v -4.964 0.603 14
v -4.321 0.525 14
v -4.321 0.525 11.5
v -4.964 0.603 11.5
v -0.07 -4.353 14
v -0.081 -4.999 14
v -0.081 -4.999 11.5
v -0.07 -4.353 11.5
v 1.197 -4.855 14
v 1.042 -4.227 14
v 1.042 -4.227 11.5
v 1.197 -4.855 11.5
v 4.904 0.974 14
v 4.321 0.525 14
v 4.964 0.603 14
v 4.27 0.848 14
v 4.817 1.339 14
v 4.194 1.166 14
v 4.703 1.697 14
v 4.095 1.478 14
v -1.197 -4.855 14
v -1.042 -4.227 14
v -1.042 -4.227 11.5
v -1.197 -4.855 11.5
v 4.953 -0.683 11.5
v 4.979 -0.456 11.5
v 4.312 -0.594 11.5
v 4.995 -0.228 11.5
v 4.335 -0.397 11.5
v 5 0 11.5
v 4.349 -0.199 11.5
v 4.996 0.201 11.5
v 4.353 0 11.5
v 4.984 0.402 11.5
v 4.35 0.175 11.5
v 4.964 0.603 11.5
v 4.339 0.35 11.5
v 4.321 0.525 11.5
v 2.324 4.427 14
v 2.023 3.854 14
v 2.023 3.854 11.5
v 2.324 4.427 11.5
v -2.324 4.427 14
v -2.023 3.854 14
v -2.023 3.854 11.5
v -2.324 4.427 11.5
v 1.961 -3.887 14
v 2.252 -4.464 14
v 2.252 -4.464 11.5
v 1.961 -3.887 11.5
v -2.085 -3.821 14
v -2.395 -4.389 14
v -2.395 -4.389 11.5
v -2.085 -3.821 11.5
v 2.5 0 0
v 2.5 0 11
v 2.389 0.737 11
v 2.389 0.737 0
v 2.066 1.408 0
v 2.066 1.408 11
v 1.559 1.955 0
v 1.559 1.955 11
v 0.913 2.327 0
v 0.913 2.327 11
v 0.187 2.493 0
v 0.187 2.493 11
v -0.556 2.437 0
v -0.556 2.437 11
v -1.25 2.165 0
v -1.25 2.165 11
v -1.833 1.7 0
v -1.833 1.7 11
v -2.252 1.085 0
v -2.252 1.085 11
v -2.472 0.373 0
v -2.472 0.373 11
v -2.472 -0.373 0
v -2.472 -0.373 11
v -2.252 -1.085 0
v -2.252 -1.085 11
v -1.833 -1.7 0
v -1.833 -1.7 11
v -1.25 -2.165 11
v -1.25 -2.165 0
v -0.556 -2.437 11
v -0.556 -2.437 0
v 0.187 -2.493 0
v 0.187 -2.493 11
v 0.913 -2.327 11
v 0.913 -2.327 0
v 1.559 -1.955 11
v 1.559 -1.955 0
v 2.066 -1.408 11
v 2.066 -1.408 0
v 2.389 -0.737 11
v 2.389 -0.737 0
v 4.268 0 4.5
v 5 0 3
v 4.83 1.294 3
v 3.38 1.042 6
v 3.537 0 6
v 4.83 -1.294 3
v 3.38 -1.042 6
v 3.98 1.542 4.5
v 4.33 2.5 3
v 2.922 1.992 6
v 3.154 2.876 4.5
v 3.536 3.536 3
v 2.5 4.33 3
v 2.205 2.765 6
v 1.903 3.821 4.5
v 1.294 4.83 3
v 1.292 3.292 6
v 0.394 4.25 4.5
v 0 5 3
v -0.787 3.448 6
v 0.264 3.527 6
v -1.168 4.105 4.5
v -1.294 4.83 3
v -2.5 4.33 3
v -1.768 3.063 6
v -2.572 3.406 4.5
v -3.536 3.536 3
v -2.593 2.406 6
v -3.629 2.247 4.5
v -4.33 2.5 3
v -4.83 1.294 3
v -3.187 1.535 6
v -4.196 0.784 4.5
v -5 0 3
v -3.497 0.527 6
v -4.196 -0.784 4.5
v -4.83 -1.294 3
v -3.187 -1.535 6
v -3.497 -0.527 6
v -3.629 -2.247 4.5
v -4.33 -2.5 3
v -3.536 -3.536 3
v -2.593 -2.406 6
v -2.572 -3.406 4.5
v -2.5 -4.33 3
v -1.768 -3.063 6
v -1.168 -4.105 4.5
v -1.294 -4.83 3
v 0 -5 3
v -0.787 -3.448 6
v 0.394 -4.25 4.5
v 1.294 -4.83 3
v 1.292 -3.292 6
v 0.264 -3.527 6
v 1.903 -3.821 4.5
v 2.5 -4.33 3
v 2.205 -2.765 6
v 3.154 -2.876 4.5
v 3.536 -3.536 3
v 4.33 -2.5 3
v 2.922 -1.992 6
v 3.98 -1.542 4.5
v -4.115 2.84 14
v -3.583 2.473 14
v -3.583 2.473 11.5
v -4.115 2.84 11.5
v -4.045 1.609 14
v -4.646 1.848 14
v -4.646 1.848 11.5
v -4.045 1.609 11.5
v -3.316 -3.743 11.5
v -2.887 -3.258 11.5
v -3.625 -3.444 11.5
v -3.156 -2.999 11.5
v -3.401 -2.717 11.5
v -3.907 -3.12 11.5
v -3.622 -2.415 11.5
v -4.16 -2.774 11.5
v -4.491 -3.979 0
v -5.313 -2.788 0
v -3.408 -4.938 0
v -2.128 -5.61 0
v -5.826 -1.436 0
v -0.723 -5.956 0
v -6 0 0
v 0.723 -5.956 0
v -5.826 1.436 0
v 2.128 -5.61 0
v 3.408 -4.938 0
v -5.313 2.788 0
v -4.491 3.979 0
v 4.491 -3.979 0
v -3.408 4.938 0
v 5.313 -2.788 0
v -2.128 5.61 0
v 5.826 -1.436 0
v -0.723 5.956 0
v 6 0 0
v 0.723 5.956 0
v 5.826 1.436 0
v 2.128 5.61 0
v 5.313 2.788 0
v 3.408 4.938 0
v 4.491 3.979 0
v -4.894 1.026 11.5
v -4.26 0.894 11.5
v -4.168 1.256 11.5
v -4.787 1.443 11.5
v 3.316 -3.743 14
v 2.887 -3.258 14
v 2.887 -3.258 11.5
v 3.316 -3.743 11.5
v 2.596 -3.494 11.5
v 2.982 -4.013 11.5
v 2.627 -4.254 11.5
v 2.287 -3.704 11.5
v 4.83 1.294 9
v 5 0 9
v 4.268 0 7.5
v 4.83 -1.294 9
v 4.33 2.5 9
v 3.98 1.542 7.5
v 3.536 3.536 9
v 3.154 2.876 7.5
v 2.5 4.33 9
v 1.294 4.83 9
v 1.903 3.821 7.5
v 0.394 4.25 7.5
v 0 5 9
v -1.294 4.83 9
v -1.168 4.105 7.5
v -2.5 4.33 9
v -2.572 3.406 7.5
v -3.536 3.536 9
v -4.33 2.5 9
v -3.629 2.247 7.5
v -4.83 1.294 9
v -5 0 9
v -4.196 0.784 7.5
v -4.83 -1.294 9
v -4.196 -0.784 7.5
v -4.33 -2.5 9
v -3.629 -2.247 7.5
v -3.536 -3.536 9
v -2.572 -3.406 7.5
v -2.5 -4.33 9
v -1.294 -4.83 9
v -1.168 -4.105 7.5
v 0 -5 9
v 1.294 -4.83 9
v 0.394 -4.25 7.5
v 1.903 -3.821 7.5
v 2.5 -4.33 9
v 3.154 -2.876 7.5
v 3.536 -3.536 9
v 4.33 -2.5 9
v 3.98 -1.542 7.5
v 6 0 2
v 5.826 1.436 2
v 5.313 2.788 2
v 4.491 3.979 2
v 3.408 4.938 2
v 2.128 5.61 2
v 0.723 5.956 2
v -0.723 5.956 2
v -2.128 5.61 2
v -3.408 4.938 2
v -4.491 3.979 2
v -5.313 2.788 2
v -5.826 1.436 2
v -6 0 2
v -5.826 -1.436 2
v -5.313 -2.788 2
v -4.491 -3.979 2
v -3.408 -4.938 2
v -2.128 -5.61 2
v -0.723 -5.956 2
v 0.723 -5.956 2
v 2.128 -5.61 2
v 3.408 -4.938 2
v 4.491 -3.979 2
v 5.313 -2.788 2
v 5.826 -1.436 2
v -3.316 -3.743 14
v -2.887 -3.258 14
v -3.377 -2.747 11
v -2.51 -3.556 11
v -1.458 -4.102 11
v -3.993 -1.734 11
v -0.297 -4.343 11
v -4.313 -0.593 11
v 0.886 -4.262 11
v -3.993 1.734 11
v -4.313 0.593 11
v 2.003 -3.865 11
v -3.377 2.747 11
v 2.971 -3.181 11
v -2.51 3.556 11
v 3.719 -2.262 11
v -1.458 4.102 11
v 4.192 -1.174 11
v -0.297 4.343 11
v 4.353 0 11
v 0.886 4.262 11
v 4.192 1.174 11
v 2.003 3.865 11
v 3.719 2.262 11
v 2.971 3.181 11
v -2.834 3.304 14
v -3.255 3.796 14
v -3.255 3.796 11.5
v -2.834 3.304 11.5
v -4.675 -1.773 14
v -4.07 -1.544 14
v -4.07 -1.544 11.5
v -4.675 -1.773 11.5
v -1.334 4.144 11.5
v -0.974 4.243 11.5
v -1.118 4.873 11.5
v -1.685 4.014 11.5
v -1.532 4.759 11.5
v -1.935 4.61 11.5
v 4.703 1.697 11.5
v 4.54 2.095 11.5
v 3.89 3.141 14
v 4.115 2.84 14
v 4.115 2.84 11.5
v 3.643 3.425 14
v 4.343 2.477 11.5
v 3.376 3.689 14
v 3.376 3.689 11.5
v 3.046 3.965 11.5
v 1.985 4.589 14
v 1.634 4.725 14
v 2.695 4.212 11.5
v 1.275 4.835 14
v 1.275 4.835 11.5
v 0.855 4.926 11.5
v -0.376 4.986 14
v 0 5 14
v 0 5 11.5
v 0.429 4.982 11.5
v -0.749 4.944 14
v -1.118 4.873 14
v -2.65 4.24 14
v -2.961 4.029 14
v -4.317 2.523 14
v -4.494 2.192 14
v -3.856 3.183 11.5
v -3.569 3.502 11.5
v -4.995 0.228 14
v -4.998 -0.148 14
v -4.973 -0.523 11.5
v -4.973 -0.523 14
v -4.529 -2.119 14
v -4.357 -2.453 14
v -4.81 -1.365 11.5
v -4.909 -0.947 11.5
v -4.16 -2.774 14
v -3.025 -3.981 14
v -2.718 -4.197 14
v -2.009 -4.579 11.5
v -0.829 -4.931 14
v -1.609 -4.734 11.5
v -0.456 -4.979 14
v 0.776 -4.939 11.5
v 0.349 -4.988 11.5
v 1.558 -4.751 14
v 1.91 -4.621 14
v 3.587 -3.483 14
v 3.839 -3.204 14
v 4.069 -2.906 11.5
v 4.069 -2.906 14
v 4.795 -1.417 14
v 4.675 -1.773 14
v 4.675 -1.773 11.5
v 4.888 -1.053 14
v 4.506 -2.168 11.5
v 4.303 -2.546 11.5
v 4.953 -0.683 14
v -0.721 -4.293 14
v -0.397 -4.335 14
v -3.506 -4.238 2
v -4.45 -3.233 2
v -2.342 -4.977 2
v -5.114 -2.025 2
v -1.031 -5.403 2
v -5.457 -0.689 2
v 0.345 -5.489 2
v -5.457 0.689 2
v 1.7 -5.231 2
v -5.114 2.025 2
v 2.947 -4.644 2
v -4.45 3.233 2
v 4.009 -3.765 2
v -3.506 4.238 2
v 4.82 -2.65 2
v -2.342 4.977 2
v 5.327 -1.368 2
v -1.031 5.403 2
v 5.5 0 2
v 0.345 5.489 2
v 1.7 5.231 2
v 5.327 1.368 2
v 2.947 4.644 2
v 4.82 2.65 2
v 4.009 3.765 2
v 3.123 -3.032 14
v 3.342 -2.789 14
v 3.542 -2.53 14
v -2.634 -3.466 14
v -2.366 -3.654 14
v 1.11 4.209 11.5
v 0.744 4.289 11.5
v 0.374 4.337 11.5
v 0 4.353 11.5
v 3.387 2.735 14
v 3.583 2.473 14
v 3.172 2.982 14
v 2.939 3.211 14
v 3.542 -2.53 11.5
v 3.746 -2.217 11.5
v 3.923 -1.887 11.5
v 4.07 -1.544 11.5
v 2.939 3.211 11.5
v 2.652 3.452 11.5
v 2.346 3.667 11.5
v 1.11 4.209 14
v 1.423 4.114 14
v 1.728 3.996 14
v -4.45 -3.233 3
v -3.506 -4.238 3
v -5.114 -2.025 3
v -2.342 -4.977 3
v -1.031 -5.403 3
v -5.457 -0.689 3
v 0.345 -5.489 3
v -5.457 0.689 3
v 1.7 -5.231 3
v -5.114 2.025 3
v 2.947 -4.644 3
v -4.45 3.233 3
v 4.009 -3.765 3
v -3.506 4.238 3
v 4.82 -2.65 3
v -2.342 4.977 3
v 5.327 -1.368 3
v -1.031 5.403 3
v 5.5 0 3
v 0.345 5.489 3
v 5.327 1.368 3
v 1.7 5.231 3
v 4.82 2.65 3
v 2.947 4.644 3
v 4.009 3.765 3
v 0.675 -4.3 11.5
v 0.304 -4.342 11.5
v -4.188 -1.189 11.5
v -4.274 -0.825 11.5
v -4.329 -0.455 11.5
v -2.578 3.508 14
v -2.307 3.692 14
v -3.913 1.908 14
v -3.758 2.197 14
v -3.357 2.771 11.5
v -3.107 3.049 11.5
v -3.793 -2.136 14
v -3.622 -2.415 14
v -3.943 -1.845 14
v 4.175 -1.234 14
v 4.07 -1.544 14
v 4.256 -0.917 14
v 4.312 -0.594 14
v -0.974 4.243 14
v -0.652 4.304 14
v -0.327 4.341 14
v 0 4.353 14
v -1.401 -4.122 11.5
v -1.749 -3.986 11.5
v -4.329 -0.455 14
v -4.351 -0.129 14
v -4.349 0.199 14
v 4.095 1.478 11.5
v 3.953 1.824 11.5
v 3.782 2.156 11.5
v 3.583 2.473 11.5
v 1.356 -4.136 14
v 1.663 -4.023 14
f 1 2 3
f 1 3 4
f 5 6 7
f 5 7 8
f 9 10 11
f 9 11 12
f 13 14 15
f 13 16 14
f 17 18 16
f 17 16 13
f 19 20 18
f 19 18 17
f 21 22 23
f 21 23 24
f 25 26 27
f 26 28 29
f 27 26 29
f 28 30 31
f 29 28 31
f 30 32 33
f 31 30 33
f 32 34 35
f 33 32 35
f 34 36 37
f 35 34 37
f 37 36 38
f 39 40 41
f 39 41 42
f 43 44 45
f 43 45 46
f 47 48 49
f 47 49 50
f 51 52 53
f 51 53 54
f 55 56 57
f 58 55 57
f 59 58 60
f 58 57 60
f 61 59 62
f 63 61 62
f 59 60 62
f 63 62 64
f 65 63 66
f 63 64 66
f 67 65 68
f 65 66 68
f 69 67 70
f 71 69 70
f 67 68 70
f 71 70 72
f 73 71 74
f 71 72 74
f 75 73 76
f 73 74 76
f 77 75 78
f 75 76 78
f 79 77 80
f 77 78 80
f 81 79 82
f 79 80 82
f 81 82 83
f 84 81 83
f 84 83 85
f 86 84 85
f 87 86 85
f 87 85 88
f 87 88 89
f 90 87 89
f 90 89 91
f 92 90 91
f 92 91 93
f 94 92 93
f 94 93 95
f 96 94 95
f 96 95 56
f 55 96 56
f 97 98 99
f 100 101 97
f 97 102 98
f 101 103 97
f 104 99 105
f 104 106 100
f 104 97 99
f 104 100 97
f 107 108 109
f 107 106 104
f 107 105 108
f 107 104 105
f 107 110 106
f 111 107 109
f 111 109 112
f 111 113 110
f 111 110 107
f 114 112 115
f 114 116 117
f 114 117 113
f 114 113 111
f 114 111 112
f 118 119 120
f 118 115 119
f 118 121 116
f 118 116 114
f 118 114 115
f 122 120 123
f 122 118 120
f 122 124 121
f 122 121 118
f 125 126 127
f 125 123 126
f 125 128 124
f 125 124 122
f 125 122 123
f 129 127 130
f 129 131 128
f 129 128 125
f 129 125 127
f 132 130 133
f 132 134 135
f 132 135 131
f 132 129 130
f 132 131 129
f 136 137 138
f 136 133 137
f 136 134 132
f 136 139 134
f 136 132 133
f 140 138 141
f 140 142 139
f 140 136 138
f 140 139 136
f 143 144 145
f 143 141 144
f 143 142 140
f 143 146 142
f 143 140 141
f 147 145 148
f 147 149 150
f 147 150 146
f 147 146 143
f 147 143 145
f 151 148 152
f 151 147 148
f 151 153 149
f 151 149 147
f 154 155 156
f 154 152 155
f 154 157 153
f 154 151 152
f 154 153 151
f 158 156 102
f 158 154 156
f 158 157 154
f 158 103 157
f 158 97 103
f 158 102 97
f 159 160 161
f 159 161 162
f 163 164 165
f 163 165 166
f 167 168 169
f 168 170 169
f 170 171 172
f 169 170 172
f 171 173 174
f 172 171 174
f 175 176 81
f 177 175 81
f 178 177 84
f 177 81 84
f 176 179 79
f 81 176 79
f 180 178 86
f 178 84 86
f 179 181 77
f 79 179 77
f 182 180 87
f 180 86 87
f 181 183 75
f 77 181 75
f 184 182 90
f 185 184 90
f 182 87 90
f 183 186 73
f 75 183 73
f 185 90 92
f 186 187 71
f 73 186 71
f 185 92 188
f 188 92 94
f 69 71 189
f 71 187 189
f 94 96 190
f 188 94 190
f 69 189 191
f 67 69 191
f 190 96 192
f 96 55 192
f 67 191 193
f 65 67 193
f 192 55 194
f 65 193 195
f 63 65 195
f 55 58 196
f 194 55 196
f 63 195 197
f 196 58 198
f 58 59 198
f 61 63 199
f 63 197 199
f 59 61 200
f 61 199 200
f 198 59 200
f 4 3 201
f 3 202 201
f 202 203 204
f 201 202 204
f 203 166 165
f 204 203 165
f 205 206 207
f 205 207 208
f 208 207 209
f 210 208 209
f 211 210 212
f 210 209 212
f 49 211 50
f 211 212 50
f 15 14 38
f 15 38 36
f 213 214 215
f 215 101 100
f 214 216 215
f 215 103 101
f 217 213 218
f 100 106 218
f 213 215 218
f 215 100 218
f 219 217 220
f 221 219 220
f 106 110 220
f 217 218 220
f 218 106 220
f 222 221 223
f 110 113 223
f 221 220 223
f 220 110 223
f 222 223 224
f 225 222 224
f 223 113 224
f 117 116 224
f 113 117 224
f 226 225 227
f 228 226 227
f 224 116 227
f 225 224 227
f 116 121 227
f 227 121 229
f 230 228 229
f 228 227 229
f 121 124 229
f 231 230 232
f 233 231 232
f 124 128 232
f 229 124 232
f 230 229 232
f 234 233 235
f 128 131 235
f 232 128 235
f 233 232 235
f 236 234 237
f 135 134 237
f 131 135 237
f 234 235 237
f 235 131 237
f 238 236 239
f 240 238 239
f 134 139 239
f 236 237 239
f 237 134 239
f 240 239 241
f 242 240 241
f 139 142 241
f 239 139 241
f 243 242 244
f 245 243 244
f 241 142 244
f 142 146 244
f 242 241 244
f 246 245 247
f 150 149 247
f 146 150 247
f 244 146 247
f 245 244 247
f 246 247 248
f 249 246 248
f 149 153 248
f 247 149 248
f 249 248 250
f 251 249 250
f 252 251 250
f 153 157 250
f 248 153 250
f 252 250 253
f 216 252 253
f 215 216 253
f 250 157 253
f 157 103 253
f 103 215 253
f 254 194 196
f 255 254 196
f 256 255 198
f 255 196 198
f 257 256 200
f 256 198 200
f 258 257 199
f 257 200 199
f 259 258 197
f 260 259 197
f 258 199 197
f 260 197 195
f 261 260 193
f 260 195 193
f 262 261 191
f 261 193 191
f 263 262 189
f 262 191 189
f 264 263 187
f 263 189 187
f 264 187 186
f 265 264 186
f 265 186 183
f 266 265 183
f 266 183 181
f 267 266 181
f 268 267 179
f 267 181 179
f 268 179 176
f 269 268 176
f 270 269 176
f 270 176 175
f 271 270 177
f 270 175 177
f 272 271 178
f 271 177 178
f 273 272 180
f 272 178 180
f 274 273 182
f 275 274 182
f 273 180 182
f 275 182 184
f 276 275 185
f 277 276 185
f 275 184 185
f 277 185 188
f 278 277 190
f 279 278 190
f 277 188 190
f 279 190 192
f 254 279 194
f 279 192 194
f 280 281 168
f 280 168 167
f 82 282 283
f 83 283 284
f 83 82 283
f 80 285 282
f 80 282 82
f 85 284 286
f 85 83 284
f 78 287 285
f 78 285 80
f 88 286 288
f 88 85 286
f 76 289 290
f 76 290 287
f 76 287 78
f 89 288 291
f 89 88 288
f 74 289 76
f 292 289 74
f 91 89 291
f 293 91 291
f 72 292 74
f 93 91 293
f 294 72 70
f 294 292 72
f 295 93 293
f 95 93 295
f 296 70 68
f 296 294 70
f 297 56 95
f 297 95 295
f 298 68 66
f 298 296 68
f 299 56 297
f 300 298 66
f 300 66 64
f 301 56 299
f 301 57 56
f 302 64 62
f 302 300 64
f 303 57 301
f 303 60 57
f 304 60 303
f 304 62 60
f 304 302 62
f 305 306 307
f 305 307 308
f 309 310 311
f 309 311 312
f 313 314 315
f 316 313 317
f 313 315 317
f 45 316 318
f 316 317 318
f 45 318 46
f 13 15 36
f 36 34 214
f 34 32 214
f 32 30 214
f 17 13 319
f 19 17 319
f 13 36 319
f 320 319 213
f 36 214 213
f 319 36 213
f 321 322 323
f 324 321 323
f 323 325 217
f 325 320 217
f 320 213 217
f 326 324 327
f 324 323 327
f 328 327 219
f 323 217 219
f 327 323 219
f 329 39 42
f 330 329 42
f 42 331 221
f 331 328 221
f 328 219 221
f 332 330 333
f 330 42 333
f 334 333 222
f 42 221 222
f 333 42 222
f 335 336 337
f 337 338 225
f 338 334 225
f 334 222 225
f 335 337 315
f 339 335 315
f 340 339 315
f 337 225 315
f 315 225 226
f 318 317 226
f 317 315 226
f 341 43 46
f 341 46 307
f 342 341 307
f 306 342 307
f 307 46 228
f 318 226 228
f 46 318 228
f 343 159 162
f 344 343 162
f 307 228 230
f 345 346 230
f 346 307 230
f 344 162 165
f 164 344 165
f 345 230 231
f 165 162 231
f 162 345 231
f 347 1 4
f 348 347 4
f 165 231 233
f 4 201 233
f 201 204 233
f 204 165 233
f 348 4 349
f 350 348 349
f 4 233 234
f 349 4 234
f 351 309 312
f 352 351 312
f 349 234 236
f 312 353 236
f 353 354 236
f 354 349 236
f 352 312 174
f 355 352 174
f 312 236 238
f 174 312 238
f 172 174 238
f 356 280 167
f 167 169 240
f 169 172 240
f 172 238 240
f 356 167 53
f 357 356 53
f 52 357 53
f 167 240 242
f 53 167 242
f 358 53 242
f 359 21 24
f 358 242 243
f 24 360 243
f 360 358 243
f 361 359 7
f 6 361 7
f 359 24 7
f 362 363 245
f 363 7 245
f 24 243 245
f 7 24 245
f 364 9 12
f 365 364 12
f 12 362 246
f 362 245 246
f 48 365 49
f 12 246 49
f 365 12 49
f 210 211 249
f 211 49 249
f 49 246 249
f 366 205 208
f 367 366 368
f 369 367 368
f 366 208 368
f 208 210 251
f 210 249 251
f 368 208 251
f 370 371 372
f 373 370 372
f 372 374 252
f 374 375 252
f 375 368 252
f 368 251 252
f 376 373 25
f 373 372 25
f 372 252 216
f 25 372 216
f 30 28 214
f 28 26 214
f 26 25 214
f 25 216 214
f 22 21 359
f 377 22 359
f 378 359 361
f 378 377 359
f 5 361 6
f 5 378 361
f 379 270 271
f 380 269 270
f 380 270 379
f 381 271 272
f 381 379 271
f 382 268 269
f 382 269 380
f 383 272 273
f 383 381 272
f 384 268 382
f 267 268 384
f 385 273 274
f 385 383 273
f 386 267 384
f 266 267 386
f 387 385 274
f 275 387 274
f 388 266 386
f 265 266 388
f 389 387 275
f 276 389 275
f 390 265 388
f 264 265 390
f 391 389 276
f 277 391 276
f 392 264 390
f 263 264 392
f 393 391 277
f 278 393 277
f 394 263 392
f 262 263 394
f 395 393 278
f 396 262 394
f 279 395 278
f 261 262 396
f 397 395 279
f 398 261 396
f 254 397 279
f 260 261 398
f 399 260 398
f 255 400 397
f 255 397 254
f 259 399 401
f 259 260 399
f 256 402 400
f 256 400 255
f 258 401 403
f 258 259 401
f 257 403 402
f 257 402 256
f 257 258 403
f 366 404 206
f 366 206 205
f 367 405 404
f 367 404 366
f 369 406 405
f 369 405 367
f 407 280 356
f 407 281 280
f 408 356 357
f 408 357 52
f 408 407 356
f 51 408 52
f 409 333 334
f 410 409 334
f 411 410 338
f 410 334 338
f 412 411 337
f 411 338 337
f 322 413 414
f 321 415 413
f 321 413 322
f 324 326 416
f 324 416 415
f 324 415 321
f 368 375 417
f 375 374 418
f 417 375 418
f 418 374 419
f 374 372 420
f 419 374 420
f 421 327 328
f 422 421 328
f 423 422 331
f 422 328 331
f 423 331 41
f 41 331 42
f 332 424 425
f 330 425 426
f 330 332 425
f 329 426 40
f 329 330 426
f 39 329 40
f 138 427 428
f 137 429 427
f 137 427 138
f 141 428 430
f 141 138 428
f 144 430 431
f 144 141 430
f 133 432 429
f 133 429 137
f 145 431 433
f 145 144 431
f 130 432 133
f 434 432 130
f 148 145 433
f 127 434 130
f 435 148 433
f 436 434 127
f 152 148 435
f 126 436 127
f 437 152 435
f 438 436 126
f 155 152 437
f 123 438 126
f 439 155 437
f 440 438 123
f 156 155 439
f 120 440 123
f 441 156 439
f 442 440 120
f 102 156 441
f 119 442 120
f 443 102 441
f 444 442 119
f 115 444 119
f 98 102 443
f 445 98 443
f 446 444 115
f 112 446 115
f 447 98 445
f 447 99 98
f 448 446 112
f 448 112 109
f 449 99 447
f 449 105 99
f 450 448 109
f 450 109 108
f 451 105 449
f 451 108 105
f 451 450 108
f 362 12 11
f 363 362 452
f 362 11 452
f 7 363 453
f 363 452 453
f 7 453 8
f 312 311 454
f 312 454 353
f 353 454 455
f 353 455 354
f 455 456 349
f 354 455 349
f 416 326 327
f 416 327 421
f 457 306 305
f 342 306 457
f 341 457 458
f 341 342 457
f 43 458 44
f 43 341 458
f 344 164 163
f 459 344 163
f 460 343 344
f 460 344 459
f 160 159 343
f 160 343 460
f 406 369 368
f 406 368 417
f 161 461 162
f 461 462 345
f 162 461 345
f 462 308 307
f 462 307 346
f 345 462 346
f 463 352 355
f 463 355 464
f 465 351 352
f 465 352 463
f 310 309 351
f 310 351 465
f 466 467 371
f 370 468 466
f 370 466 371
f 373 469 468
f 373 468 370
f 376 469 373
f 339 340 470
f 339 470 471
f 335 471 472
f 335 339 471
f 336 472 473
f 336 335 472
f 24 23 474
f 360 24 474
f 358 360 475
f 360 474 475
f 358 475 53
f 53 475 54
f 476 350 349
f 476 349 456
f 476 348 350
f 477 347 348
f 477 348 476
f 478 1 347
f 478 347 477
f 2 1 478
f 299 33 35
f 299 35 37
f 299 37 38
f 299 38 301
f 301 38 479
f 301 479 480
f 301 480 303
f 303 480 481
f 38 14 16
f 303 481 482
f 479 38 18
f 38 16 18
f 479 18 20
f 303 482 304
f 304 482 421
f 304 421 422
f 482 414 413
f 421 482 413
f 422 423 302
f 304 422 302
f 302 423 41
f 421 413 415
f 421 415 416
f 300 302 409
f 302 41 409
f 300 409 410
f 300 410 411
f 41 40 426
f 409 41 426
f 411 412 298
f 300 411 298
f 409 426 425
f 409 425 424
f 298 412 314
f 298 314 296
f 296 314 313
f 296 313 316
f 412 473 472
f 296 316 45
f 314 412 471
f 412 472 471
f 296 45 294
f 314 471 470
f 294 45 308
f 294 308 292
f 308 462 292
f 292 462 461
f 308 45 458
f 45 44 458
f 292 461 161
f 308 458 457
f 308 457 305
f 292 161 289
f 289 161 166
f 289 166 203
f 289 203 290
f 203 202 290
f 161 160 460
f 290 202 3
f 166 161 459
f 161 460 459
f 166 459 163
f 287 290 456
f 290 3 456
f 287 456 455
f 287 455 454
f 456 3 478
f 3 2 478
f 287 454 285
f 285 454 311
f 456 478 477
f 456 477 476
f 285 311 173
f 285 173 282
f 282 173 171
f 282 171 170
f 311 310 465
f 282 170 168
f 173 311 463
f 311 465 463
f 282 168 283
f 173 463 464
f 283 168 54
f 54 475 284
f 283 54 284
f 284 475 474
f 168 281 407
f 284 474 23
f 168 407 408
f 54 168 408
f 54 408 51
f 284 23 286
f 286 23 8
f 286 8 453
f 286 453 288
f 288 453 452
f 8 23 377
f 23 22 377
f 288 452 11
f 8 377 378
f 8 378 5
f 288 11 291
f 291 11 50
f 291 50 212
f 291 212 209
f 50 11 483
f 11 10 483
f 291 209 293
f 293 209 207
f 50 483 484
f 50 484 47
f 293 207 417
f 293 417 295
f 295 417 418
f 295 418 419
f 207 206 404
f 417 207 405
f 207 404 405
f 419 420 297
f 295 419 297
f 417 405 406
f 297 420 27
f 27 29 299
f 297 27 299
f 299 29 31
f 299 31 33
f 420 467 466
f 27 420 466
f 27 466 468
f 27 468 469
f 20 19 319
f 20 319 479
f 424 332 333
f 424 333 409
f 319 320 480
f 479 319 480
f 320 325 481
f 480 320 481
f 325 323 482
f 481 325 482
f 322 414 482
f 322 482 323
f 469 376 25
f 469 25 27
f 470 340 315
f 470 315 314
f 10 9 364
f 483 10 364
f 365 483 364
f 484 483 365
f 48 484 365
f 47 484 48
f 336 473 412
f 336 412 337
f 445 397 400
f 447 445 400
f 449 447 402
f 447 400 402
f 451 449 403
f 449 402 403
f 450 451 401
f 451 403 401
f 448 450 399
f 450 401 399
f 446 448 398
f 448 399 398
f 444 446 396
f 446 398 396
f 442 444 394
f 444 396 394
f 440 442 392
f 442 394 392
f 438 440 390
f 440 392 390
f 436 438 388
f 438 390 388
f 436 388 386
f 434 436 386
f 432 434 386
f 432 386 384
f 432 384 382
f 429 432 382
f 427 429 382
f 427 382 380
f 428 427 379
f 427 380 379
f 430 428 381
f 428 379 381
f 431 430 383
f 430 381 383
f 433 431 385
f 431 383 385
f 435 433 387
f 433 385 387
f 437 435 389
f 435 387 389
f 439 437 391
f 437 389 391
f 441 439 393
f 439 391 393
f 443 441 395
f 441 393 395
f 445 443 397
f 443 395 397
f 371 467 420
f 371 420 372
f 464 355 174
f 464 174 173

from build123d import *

# Parameters (mm, degrees)
SKETCH_1_R          = 6
EXTRUDE_1_DEPTH     = 2
SKETCH_2_R          = 5.5
EXTRUDE_2_DEPTH     = 1
SKETCH_3_R          = 5
EXTRUDE_3_DEPTH     = 3
EXTRUDE_3_TAPER     = 26
SKETCH_4_R          = 3.536802234
EXTRUDE_4_DEPTH     = 3
EXTRUDE_4_DRAFT     = -26
SKETCH_5_R          = 5
EXTRUDE_5_DEPTH     = 5
SKETCH_6_R          = 4.35308232
CUT_EXTRUDE_1_DEPTH = 3
CUT_EXTRUDE_2_DEPTH = 2.5
SKETCH_8_R          = 2.5
CUT_EXTRUDE_3_DEPTH = 14.892443989


with BuildPart() as part:
    # 스케치1 → 보스-돌출1 (new body)
    with BuildSketch(Plane.XY):
        Circle(SKETCH_1_R)
    extrude(amount=EXTRUDE_1_DEPTH)

    # 스케치2 → 보스-돌출2 (add)
    with BuildSketch(Plane.XY.offset(2)):
        Circle(SKETCH_2_R)
    extrude(amount=EXTRUDE_2_DEPTH)

    # 스케치3 → 보스-돌출3 (add)
    with BuildSketch(Plane.XY.offset(3)):
        Circle(SKETCH_3_R)
    extrude(amount=EXTRUDE_3_DEPTH, taper=EXTRUDE_3_TAPER)


with BuildPart() as extrude_4_tool:
    # 스케치4 → 보스-돌출4 (with draft: the straight prism first)
    with BuildSketch(Plane.XY.offset(6)):
        Circle(SKETCH_4_R)
    extrude(amount=EXTRUDE_4_DEPTH)
    # 보스-돌출4: the draft: its side faces are tilted about the plane it starts from
    extrude_4_sides = [extrude_4_tool.faces().sort_by_distance(p)[0] for p in [
        (-3.536802234, 0, 7.5),
    ]]
    draft(extrude_4_sides, Plane.XY.offset(6), EXTRUDE_4_DRAFT)


with BuildPart() as part_1:
    add(part.part)

    # 보스-돌출4: add extrude_4_tool
    add(extrude_4_tool.part)

    # 스케치5 → 보스-돌출5 (add)
    with BuildSketch(Plane.XY.offset(9)):
        Circle(SKETCH_5_R)
    extrude(amount=EXTRUDE_5_DEPTH)

    # 스케치6 → 컷-돌출1 (cut)
    with BuildSketch(Plane.XY.offset(14)):
        Circle(SKETCH_6_R)
    extrude(amount=-CUT_EXTRUDE_1_DEPTH, mode=Mode.SUBTRACT)

    # 스케치7 → 컷-돌출2 (cut)
    with BuildSketch(Plane.XY.offset(14)):
        with BuildLine():
            Line((0, 4.35308232), (0, 5))
            ThreePointArc((0, 5), (0.642664488, 4.958526228), (1.274667489, 4.834792942))
            Line((1.274667489, 4.834792942), (1.109746502, 4.209250336))
            ThreePointArc((1.109746502, 4.209250336), (0.559514284, 4.316974572), (0, 4.35308232))
        make_face()
        with BuildLine():
            Line((2.022978224, 3.854462971), (2.32361586, 4.427280128))
            ThreePointArc((2.32361586, 4.427280128), (2.873393181, 4.091895847), (3.375502321, 3.688629025))
            Line((3.375502321, 3.688629025), (2.938767895, 3.211381159))
            ThreePointArc((2.938767895, 3.211381159), (2.501623411, 3.562471894), (2.022978224, 3.854462971))
        make_face()
        with BuildLine():
            Line((3.582516517, 2.472832606), (4.114919329, 2.840323734))
            ThreePointArc((4.114919329, 2.840323734), (4.445862124, 2.287861441), (4.70305025, 1.697444651))
            Line((4.70305025, 1.697444651), (4.094552979, 1.47782326))
            ThreePointArc((4.094552979, 1.47782326), (3.870640762, 1.991849838), (3.582516517, 2.472832606))
        make_face()
        with BuildLine():
            Line((4.321343449, 0.524706092), (4.96354437, 0.602683401))
            ThreePointArc((4.96354437, 0.602683401), (4.999837633, -0.04029445), (4.953186046, -0.682603837))
            Line((4.953186046, -0.682603837), (4.312325321, -0.594286139))
            ThreePointArc((4.312325321, -0.594286139), (4.352940961, -0.035081012), (4.321343449, 0.524706092))
        make_face()
        with BuildLine():
            Line((4.070202675, -1.543624265), (4.675081213, -1.773024435))
            ThreePointArc((4.675081213, -1.773024435), (4.408410595, -2.359219368), (4.06860661, -2.906276011))
            Line((4.06860661, -2.906276011), (3.542195901, -2.530251744))
            ThreePointArc((3.542195901, -2.530251744), (3.838034844, -2.053975224), (4.070202675, -1.543624265))
        make_face()
        with BuildLine():
            Line((2.88662752, -3.258328904), (3.315613291, -3.742553741))
            ThreePointArc((3.315613291, -3.742553741), (2.807069816, -4.137675561), (2.251958432, -4.464155376))
            Line((2.251958432, -4.464155376), (1.960592088, -3.886567168))
            ThreePointArc((1.960592088, -3.886567168), (2.443881198, -3.602328466), (2.88662752, -3.258328904))
        make_face()
        with BuildLine():
            Line((1.041760787, -4.22658966), (1.196578321, -4.854709087))
            ThreePointArc((1.196578321, -4.854709087), (0.562663172, -4.968240147), (-0.080586283, -4.999350543))
            Line((-0.080586283, -4.999350543), (-0.070159745, -4.352516892))
            ThreePointArc((-0.070159745, -4.352516892), (0.489863821, -4.325431669), (1.041760787, -4.22658966))
        make_face()
        with BuildLine():
            Line((-1.041760787, -4.22658966), (-1.196578321, -4.854709087))
            ThreePointArc((-1.196578321, -4.854709087), (-1.810642825, -4.660640789), (-2.394669653, -4.389254749))
            Line((-2.394669653, -4.389254749), (-2.084838826, -3.82135745))
            ThreePointArc((-2.084838826, -3.82135745), (-1.576375454, -4.057630604), (-1.041760787, -4.22658966))
        make_face()
        with BuildLine():
            Line((-2.88662752, -3.258328904), (-3.315613291, -3.742553741))
            ThreePointArc((-3.315613291, -3.742553741), (-3.76915237, -3.285344793), (-4.160163063, -2.773633589))
            Line((-4.160163063, -2.773633589), (-3.621906456, -2.414771068))
            ThreePointArc((-3.621906456, -2.414771068), (-3.281486109, -2.860275267), (-2.88662752, -3.258328904))
        make_face()
        with BuildLine():
            Line((-4.070202675, -1.543624265), (-4.675081213, -1.773024435))
            ThreePointArc((-4.675081213, -1.773024435), (-4.864194531, -1.157415898), (-4.972613252, -0.522606399))
            Line((-4.972613252, -0.522606399), (-4.329238966, -0.454989735))
            ThreePointArc((-4.329238966, -0.454989735), (-4.234847844, -1.007665336), (-4.070202675, -1.543624265))
        make_face()
        with BuildLine():
            Line((-4.321343449, 0.524706092), (-4.96354437, 0.602683401))
            ThreePointArc((-4.96354437, 0.602683401), (-4.844908345, 1.235663031), (-4.645897671, 1.848143618))
            Line((-4.645897671, 1.848143618), (-4.044795002, 1.609024262))
            ThreePointArc((-4.044795002, 1.609024262), (-4.218056972, 1.075788579), (-4.321343449, 0.524706092))
        make_face()
        with BuildLine():
            Line((-3.582516517, 2.472832606), (-4.114919329, 2.840323734))
            ThreePointArc((-4.114919329, 2.840323734), (-3.715712045, 3.345666451), (-3.254862922, 3.795506206))
            Line((-3.254862922, 3.795506206), (-2.833737248, 3.304430192))
            ThreePointArc((-2.833737248, 3.304430192), (-3.234960082, 2.912792296), (-3.582516517, 2.472832606))
        make_face()
        with BuildLine():
            Line((-2.022978224, 3.854462971), (-2.32361586, 4.427280128))
            ThreePointArc((-2.32361586, 4.427280128), (-1.735290894, 4.689218007), (-1.118178304, 4.873364062))
            Line((-1.118178304, 4.873364062), (-0.973504441, 4.242830988))
            ThreePointArc((-0.973504441, 4.242830988), (-1.510772822, 4.0825104), (-2.022978224, 3.854462971))
        make_face()
    extrude(amount=-CUT_EXTRUDE_2_DEPTH, mode=Mode.SUBTRACT)

    # 스케치8 → 컷-돌출3 (cut, through all)
    with BuildSketch(Plane.XY.offset(11)):
        Circle(SKETCH_8_R)
    extrude(amount=-CUT_EXTRUDE_3_DEPTH, mode=Mode.SUBTRACT)


solid = part_1.part
